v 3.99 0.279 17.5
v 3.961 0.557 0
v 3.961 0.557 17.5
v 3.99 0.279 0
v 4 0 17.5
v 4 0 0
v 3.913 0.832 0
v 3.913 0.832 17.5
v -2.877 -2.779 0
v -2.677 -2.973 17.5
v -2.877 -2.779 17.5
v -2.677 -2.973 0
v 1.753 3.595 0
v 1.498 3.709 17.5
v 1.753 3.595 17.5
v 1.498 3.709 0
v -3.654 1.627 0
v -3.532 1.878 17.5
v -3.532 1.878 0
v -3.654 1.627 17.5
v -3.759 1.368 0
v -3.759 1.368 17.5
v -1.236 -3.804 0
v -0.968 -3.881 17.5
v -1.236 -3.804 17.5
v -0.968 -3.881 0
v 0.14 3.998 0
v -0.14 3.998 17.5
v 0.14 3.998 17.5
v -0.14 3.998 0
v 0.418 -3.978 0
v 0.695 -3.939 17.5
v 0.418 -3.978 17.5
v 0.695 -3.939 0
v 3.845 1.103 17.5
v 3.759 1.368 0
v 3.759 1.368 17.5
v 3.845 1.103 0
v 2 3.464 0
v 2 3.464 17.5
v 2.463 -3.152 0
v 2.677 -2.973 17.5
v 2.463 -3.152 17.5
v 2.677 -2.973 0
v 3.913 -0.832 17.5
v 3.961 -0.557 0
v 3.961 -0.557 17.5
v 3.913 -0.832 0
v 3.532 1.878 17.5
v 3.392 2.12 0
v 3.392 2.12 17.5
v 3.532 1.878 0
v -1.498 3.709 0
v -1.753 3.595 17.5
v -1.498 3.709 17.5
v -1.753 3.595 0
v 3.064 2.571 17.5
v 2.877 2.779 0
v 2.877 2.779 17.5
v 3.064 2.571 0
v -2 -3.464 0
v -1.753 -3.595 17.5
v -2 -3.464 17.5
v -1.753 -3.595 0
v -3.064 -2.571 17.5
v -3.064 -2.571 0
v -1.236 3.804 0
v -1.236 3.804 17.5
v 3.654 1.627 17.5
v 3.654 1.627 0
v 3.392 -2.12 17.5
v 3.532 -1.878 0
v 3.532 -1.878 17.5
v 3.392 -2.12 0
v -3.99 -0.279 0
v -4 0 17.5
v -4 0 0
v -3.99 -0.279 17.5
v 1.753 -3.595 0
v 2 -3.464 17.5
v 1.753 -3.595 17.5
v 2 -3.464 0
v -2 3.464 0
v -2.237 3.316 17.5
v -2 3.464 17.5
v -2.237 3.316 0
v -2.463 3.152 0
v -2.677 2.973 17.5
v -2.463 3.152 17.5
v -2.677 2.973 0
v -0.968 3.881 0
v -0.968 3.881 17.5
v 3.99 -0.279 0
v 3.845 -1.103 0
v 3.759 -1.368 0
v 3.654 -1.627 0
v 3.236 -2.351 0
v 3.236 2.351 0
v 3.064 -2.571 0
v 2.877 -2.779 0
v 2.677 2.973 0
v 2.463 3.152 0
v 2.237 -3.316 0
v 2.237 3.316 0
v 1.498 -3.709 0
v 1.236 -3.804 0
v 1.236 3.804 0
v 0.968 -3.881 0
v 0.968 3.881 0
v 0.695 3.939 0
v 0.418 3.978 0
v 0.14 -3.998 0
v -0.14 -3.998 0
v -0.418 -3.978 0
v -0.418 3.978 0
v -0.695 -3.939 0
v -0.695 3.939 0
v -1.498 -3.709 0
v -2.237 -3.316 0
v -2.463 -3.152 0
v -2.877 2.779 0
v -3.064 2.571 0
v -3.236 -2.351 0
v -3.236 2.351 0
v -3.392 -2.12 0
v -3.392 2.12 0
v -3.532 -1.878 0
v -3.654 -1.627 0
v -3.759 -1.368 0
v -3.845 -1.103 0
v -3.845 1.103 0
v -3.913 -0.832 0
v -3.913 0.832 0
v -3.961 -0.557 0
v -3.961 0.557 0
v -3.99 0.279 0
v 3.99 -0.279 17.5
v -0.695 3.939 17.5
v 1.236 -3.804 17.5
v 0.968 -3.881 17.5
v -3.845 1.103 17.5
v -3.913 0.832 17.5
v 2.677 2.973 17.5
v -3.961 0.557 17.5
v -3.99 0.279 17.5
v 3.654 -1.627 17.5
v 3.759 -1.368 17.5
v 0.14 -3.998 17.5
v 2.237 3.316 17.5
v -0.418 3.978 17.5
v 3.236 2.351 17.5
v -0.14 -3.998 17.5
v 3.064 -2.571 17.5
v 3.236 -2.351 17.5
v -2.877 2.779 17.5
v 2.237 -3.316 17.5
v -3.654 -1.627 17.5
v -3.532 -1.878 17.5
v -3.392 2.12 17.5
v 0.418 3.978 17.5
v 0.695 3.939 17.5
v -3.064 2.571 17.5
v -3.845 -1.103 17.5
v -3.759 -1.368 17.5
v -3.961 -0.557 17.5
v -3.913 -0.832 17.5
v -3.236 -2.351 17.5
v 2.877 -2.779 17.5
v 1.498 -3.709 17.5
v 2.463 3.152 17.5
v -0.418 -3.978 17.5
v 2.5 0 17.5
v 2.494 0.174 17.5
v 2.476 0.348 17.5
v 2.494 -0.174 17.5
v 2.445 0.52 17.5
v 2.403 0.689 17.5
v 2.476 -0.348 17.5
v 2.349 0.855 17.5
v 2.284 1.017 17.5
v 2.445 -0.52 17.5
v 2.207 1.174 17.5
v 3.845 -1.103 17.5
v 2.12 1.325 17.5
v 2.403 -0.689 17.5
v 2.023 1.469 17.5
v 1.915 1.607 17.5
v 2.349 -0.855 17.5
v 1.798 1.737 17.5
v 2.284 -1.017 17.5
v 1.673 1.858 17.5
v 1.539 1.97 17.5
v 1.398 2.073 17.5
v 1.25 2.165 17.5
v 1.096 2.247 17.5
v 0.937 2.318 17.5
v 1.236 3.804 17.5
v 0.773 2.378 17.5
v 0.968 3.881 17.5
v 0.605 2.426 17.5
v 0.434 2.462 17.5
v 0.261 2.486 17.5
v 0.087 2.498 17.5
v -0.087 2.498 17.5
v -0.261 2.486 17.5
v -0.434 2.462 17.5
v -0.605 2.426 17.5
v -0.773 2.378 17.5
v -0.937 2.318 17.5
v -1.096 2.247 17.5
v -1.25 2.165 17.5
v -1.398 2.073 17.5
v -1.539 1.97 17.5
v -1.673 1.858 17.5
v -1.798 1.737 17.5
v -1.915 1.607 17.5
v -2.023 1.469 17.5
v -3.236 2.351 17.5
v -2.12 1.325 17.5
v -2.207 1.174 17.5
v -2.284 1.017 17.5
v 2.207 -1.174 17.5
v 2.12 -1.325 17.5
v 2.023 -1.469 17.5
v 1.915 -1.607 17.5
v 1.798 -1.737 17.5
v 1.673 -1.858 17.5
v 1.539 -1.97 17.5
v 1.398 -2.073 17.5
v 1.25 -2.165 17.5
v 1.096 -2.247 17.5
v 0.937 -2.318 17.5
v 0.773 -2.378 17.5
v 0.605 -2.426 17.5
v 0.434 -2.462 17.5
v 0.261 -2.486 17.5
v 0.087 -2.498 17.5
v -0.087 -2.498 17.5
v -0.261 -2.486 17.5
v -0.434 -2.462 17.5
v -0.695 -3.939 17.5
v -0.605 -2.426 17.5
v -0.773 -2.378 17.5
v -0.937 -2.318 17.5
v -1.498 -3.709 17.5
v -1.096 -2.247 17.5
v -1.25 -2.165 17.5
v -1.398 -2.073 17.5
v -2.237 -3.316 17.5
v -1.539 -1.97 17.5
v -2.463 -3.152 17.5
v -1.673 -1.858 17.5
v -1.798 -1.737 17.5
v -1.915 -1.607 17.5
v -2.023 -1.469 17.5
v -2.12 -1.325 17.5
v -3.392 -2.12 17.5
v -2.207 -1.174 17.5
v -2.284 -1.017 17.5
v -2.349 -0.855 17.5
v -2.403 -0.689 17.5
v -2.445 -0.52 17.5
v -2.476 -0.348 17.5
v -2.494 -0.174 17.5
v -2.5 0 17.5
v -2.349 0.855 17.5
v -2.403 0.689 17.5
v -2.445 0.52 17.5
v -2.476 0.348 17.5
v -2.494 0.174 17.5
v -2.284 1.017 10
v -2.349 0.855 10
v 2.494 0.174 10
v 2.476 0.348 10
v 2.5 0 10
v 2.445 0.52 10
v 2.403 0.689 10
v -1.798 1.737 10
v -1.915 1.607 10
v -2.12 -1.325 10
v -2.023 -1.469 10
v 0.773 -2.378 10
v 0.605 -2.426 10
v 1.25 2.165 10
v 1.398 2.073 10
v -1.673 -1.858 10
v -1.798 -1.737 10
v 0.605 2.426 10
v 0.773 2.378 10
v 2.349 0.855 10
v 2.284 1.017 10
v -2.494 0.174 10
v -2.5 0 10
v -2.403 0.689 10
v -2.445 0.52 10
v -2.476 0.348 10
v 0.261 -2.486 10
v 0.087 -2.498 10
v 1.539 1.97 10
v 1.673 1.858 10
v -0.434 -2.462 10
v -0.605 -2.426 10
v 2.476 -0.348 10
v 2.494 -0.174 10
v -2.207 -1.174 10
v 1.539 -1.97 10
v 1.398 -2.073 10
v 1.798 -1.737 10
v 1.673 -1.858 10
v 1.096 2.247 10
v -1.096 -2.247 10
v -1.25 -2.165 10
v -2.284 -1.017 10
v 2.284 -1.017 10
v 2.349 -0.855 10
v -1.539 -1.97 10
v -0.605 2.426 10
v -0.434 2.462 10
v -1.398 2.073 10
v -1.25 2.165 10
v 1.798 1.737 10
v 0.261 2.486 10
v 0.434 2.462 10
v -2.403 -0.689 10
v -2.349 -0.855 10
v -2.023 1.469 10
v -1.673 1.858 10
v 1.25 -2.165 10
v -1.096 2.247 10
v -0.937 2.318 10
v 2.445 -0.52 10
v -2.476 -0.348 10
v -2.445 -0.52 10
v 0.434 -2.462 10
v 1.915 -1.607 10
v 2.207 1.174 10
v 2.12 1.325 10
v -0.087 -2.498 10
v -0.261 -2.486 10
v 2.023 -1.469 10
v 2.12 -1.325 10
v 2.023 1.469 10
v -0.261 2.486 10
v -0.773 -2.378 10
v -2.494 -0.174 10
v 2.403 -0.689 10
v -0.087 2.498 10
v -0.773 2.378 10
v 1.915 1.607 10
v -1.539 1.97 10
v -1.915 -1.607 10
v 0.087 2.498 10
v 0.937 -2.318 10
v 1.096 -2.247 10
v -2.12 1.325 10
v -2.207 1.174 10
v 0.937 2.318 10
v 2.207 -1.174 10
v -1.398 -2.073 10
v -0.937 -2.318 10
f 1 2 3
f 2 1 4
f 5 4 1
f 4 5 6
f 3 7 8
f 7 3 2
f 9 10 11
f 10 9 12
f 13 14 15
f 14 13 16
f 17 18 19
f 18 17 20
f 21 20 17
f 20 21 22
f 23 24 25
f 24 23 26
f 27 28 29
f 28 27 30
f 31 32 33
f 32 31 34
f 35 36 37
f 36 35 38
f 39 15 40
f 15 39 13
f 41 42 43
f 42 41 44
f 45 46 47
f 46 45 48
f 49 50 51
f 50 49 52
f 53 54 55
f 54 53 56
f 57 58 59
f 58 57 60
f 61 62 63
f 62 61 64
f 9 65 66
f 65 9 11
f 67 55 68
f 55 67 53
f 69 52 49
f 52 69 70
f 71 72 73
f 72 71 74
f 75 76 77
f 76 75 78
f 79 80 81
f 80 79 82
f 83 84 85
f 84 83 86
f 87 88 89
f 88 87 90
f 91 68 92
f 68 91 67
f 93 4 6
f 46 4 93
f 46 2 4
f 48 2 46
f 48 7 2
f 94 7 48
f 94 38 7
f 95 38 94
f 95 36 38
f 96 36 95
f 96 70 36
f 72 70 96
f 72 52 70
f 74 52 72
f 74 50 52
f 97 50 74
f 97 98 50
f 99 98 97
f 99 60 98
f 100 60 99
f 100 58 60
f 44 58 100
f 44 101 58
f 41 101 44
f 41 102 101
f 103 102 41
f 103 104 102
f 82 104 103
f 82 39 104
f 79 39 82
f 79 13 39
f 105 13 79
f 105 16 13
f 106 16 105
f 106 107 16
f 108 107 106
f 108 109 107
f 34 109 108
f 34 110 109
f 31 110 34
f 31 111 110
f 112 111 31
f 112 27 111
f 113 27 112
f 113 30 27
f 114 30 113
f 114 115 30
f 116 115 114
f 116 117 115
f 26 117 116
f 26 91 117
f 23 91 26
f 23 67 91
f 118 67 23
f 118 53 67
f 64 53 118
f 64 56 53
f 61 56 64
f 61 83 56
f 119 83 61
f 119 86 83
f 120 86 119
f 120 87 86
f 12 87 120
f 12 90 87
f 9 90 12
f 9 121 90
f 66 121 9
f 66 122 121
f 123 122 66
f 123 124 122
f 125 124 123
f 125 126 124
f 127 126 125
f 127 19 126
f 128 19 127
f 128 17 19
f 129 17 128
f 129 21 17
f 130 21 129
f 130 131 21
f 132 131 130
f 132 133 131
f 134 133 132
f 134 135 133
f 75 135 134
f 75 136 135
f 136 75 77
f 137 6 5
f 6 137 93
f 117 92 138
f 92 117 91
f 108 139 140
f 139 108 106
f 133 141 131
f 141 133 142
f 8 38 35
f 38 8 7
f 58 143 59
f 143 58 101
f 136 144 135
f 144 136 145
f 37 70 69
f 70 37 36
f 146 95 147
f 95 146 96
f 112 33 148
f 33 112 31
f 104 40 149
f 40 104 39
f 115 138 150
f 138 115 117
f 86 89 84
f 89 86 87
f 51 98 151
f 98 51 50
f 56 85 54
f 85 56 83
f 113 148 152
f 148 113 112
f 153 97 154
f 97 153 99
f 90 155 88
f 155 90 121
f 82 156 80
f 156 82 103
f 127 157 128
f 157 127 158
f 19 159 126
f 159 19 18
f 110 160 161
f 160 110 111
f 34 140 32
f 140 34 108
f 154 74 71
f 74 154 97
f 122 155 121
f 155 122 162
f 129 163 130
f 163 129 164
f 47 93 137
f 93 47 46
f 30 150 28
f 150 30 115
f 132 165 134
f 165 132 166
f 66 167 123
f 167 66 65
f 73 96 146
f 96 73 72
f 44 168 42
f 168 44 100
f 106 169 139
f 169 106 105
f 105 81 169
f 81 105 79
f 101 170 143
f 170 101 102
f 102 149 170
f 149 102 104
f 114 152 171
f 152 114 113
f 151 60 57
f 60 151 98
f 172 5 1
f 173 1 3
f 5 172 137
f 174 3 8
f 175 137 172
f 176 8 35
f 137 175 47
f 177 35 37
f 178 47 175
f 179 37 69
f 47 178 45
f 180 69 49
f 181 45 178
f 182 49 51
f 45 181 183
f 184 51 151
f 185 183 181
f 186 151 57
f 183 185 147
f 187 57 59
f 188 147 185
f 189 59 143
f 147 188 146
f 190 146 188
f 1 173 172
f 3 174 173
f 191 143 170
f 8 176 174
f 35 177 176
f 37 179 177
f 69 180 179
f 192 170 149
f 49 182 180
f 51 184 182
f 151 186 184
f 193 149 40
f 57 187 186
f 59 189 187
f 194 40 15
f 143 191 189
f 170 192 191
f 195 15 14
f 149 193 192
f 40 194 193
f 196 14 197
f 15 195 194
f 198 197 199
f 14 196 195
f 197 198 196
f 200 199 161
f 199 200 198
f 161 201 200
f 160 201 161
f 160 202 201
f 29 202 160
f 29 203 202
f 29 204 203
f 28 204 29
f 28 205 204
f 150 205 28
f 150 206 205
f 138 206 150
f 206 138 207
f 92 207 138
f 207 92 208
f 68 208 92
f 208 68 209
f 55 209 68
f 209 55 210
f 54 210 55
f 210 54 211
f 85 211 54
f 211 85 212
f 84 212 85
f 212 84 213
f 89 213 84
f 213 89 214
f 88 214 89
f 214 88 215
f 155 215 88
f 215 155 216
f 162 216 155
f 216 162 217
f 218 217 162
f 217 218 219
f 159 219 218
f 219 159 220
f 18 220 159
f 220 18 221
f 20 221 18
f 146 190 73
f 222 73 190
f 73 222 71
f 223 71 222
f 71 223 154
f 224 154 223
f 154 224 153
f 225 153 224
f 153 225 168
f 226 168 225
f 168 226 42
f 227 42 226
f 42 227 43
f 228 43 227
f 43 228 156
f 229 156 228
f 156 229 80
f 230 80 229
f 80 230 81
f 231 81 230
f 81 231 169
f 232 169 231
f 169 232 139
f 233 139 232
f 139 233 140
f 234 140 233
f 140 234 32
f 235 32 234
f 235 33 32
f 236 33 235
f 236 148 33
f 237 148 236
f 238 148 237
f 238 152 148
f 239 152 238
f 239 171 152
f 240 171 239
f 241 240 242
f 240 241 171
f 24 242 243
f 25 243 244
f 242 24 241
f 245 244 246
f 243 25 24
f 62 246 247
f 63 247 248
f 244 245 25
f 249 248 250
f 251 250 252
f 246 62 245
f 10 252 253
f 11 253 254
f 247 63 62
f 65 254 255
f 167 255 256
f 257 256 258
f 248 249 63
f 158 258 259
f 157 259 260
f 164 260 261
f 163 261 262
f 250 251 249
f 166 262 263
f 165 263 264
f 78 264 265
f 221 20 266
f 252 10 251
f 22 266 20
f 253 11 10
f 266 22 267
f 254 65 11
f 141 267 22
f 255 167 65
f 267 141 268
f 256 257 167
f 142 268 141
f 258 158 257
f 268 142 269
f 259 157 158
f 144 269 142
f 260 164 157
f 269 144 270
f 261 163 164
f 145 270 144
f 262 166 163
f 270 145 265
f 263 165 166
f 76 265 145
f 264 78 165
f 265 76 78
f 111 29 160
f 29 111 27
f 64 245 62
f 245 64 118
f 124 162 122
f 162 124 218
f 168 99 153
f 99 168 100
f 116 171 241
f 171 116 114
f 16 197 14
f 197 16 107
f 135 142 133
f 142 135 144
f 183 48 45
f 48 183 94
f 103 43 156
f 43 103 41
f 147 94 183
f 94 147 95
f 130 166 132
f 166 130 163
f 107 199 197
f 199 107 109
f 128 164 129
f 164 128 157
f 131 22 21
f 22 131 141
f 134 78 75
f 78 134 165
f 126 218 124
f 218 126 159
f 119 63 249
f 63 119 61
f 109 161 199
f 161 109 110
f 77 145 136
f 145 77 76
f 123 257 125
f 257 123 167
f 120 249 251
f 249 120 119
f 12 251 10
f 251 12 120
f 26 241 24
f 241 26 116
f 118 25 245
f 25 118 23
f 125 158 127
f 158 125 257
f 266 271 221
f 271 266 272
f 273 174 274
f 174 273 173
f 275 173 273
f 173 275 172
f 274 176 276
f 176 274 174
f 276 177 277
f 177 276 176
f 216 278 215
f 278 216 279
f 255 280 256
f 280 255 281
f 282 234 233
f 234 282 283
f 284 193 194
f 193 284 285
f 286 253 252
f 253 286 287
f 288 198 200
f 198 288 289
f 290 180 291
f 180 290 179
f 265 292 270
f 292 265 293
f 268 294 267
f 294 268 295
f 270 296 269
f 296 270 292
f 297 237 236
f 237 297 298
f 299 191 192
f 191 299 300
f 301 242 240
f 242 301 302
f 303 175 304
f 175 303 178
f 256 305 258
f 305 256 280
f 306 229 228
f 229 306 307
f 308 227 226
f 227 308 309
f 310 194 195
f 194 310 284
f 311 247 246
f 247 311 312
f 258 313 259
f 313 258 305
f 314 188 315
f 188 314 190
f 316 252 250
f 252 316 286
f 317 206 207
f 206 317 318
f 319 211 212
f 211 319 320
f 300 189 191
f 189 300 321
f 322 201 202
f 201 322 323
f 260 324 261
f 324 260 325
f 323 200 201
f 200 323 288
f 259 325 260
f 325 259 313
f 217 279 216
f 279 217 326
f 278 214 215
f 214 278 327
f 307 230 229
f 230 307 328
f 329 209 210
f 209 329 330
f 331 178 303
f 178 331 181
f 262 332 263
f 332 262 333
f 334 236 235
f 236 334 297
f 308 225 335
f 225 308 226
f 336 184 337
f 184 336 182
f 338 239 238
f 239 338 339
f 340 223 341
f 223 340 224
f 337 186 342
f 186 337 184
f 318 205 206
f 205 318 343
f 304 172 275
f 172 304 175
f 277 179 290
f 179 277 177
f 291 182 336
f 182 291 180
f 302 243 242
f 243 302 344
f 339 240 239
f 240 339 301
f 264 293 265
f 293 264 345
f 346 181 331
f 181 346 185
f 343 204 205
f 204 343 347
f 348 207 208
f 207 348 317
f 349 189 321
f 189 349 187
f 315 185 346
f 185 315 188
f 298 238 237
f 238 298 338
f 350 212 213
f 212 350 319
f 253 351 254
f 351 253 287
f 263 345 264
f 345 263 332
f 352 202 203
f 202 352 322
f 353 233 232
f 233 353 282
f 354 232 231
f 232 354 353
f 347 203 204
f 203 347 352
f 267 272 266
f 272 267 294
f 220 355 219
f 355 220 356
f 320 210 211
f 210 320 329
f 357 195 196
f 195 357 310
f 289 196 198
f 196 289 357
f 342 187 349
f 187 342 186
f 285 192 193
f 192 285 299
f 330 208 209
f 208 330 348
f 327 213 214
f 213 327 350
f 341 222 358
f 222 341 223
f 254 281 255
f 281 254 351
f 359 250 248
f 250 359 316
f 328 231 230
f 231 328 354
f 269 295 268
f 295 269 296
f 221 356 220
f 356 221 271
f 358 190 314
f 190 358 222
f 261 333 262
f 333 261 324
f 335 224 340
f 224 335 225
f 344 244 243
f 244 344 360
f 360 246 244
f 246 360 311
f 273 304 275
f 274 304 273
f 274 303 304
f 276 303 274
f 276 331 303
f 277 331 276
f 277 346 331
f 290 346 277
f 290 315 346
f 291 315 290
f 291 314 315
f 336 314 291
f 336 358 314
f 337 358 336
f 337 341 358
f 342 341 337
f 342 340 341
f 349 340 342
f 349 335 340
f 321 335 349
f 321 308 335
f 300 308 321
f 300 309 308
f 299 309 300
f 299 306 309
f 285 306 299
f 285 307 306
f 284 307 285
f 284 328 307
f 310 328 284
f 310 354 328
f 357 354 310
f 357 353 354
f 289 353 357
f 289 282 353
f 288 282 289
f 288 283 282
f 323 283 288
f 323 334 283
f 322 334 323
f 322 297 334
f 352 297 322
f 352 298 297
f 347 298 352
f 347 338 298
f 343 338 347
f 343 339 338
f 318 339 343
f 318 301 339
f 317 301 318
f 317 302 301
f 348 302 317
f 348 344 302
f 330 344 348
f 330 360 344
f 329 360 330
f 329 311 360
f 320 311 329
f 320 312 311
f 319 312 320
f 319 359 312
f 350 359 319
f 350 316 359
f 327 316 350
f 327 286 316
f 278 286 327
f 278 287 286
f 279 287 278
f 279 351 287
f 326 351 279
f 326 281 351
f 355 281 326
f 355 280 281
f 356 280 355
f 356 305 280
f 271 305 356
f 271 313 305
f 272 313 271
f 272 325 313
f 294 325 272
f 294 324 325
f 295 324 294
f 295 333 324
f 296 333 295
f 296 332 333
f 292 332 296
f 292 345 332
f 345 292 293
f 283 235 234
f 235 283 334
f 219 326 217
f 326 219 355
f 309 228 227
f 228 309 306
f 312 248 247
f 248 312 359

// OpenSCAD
$fa=4; // default minimum facet angle is now 0.5
$fs=0.05; // default minimum facet size is now 0.05 mm

difference() {
  cylinder(h = 17.5, r = 4);
  translate([0, 0, 10]) cylinder(h = 15, r = 2.5);
}
